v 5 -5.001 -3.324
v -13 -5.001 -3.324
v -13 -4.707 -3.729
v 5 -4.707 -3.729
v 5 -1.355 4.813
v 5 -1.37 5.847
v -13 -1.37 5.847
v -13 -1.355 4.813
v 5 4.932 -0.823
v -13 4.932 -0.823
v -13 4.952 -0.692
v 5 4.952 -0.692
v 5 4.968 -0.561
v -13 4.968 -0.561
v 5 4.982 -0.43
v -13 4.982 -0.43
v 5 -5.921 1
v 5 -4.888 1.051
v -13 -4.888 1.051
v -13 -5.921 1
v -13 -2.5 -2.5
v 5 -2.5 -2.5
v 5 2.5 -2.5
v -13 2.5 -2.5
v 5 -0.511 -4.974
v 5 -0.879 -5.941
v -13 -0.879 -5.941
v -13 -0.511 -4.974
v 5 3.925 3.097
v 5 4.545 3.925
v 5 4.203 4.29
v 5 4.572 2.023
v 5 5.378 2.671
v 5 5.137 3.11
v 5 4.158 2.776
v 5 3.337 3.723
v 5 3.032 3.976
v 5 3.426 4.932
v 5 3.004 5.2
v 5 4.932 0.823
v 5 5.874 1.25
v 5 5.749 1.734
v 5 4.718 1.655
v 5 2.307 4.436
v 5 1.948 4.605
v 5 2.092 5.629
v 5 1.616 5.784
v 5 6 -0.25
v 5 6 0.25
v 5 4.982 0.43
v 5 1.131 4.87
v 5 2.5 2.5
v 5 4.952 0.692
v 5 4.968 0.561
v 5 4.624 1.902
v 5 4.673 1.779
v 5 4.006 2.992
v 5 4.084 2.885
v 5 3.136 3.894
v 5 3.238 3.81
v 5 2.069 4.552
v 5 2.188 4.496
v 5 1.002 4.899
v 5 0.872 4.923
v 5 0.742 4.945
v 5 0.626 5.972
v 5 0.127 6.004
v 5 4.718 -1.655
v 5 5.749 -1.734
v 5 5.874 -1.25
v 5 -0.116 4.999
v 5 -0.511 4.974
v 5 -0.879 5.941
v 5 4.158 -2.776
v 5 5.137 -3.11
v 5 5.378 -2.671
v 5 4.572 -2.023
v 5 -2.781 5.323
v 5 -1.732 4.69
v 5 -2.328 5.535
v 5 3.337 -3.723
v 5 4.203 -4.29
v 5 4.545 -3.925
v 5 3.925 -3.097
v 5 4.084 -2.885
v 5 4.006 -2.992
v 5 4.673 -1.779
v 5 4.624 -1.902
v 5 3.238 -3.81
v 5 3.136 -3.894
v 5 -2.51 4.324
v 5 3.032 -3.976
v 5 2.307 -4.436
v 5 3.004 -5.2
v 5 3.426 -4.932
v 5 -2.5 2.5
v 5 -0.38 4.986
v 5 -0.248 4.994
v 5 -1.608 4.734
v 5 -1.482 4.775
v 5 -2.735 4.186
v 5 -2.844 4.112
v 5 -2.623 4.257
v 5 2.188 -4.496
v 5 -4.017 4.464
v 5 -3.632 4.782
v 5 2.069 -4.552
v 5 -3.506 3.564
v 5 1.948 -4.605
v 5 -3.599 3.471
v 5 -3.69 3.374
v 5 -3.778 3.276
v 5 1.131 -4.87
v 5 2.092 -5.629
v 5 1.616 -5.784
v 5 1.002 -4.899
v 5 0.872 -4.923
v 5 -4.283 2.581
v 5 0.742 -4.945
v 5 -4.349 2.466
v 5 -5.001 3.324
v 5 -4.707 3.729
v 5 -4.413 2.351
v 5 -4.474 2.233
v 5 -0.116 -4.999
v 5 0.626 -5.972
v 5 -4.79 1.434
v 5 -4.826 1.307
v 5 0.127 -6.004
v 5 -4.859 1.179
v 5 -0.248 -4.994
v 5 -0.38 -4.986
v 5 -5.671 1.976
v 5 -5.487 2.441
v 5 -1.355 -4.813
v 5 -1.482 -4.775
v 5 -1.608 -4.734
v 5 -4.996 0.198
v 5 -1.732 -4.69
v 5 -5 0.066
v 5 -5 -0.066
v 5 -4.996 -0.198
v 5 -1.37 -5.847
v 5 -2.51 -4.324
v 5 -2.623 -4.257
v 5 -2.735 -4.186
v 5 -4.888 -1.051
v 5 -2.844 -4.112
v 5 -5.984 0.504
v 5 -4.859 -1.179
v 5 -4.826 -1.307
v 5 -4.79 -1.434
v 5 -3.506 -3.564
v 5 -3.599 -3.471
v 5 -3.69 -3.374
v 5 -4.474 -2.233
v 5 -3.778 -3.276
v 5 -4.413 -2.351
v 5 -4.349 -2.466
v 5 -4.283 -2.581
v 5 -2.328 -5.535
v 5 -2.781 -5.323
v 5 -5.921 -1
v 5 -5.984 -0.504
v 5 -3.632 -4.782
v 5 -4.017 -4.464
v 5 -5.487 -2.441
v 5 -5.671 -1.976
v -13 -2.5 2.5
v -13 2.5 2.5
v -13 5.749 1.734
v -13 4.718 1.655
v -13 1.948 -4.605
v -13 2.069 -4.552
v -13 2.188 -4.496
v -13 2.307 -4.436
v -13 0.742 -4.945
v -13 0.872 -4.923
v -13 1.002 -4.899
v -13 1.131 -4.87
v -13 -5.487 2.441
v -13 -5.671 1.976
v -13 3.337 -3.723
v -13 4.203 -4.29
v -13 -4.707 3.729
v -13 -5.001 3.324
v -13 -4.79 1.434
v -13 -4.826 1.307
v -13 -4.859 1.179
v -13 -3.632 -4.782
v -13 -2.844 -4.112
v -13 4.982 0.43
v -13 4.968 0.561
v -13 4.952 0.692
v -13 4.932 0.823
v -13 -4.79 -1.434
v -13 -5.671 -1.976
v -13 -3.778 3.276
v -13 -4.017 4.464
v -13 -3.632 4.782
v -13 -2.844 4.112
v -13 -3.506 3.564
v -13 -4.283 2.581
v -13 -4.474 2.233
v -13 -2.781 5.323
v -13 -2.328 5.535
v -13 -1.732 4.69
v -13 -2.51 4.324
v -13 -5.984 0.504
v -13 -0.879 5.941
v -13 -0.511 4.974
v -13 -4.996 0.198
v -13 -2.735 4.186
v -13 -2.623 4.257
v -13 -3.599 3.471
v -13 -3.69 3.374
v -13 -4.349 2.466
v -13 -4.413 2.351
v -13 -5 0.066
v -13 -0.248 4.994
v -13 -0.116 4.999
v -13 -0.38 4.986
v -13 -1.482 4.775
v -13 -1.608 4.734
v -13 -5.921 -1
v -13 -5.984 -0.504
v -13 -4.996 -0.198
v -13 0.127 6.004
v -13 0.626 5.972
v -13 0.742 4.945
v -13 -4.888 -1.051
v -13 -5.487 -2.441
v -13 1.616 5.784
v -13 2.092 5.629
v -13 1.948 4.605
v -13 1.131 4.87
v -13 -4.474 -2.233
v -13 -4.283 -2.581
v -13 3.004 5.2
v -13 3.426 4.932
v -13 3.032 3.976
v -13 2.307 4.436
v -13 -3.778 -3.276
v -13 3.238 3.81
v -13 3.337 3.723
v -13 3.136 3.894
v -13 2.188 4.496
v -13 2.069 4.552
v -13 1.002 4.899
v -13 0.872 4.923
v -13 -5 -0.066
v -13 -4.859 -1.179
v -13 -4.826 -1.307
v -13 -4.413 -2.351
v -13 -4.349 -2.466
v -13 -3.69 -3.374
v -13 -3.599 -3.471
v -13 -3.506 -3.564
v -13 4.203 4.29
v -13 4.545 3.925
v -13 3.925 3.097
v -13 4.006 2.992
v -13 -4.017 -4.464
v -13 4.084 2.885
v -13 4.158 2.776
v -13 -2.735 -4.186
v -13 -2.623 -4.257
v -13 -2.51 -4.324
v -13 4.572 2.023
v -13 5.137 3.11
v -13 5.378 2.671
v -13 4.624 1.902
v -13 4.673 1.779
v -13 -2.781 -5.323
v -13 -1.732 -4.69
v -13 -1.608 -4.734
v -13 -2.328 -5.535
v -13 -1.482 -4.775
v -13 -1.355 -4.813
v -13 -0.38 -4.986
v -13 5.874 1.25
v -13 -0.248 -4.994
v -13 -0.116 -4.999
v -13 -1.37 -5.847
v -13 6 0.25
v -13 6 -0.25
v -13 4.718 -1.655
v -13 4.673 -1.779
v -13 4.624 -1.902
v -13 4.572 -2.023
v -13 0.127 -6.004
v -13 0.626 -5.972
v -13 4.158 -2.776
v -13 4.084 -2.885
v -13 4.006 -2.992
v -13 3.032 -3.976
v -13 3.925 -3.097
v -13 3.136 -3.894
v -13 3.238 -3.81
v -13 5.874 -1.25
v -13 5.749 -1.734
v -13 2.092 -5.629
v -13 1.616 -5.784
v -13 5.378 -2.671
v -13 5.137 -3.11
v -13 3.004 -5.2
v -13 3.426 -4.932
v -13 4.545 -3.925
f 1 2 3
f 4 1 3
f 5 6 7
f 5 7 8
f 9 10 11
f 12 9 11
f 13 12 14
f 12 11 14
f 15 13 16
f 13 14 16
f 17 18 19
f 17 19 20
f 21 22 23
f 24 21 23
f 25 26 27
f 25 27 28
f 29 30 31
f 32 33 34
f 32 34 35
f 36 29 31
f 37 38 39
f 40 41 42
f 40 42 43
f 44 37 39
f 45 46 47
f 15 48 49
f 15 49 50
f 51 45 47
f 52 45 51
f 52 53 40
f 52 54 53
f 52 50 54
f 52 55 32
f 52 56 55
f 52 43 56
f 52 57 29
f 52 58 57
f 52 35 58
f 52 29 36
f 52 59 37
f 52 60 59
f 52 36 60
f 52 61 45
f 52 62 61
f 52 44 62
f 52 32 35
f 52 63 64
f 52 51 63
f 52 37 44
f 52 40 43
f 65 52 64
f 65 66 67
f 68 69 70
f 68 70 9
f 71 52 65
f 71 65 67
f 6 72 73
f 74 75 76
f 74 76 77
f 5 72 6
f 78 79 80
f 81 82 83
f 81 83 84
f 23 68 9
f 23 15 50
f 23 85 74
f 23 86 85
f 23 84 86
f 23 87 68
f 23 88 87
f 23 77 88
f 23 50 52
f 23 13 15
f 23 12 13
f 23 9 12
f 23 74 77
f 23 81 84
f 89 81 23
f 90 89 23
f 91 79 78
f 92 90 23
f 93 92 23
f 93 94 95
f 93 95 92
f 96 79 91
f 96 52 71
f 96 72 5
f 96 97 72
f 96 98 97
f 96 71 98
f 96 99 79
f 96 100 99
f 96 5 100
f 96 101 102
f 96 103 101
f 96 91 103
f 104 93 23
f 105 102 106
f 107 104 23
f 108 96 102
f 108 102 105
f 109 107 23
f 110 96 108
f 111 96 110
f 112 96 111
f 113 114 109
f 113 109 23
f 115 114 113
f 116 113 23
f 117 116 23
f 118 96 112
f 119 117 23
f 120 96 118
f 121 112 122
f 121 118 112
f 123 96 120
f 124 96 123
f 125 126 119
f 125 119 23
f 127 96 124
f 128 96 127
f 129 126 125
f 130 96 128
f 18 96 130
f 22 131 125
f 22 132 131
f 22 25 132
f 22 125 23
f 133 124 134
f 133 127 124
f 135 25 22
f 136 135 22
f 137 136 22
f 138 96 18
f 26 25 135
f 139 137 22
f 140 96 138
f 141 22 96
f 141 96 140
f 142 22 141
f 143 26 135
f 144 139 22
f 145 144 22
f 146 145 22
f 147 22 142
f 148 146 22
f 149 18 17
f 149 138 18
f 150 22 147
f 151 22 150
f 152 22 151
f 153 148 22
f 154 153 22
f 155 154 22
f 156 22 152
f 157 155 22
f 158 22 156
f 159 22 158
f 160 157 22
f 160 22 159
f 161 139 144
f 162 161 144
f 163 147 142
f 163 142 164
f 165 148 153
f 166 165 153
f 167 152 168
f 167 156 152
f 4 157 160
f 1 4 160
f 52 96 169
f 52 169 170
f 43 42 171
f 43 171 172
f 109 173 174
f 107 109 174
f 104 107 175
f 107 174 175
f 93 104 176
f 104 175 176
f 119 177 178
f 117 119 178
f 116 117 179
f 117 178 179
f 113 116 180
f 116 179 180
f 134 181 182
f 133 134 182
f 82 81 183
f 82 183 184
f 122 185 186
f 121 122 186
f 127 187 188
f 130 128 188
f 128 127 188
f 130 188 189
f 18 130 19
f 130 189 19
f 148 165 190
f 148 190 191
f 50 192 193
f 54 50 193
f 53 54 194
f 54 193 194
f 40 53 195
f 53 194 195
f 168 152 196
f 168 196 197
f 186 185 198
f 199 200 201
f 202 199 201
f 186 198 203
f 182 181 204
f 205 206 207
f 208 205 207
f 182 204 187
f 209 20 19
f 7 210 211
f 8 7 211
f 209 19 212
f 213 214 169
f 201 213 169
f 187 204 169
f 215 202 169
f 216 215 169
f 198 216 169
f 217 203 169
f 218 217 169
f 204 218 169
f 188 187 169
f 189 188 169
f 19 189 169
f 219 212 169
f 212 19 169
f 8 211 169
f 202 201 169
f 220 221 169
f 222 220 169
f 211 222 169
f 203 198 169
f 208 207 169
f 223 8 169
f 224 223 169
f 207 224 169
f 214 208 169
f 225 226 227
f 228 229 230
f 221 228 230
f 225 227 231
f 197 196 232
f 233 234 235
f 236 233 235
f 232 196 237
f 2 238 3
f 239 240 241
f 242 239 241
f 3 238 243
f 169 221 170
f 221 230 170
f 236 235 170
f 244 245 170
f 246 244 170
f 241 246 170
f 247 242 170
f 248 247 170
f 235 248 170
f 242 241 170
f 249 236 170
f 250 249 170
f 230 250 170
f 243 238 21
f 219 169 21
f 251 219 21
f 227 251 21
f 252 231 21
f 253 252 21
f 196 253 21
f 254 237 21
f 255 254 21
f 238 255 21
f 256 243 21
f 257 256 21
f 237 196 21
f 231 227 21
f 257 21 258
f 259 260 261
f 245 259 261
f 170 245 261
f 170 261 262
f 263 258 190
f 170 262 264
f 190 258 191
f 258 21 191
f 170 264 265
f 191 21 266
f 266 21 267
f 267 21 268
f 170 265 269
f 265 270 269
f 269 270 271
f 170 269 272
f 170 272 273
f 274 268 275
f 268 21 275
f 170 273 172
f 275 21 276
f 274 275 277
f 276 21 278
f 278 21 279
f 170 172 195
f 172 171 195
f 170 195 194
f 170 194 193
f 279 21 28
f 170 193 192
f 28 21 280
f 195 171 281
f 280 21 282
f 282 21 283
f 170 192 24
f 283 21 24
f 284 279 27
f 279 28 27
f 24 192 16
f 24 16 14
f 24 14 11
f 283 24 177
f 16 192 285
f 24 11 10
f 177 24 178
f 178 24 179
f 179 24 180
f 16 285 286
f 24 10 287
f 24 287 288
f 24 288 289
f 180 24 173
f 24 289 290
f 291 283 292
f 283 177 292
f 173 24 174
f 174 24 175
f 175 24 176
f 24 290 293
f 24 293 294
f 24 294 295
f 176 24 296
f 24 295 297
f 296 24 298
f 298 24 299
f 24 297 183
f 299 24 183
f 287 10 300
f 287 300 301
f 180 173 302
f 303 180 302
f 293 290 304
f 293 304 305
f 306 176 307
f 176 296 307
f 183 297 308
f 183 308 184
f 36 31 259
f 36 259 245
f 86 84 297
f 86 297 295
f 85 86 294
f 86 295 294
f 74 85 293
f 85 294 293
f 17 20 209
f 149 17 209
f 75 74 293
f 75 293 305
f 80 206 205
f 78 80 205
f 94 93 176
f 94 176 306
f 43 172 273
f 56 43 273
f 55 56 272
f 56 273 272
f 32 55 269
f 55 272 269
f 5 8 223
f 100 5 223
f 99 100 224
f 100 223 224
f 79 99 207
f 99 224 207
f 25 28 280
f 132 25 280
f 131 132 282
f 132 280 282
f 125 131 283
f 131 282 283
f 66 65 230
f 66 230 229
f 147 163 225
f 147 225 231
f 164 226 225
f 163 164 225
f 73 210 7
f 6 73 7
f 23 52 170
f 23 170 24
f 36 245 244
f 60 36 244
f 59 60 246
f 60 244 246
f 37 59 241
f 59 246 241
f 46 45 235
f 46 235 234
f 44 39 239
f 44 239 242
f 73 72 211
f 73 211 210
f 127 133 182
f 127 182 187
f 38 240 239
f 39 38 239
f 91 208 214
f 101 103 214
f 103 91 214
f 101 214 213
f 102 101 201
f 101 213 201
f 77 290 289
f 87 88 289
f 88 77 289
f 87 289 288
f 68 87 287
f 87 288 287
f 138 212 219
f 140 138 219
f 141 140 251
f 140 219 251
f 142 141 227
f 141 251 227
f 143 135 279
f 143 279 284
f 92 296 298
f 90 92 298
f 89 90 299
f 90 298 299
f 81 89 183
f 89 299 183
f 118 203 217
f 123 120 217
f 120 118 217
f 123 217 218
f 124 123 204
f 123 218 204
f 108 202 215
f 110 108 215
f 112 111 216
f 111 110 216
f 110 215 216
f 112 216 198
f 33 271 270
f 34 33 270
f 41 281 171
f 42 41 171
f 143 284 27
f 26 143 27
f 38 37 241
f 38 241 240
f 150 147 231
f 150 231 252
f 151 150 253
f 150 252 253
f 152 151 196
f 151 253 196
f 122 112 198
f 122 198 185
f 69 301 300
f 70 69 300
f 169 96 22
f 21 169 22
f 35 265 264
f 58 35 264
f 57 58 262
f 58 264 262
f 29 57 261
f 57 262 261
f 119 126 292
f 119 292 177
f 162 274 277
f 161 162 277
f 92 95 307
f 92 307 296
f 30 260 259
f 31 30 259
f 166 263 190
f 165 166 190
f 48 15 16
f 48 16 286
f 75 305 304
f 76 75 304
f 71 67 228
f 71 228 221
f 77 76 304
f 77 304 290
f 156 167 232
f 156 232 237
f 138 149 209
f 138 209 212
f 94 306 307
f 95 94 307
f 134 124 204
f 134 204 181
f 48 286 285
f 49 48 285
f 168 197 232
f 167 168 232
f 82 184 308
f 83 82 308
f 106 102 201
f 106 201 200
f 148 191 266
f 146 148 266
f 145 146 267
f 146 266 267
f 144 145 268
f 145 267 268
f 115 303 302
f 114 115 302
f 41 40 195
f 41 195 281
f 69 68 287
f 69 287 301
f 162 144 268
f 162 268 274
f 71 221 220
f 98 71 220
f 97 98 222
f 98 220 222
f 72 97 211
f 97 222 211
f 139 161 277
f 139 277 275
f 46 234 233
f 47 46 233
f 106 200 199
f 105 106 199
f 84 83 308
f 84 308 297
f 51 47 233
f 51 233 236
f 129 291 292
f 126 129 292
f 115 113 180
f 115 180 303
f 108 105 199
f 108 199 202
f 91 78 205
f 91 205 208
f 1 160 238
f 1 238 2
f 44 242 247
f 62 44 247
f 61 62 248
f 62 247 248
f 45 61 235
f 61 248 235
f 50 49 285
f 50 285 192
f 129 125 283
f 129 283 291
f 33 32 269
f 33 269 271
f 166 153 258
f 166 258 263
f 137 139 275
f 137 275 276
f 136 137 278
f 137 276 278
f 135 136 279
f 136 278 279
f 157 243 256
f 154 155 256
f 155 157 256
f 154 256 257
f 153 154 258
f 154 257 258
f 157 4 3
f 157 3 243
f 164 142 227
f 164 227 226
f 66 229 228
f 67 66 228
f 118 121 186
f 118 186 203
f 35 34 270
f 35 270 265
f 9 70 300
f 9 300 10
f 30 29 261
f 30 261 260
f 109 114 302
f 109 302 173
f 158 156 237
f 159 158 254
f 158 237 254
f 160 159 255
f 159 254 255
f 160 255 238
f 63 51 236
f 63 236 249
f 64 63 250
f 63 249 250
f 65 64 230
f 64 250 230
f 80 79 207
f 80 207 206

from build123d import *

# Parameters (mm, degrees)
BOSS_EXTRUDE2_START      = -13
BOSS_EXTRUDE2_DEPTH      = 18
BOSS_EXTRUDE3_DEPTH      = 5
BOSS_EXTRUDE3_DEPTH_BACK = 13
SKETCH3_R                = 5
CIRPATTERN1_COUNT        = 25
SKETCH4_W                = 5
SKETCH4_H                = 5
CUT_EXTRUDE1_DEPTH       = 18


with BuildPart() as part:
    # Sketch2 → Boss-Extrude2 (new body)
    with BuildSketch(Plane(origin=(0, 0, 0), x_dir=(0, 0, -1), z_dir=(1, 0, 0)).offset(BOSS_EXTRUDE2_START)):
        with BuildLine():
            ThreePointArc((0.429587035, 4.981511315), (0, 5), (-0.429587035, 4.981511315))
            Line((-0.429587035, 4.981511315), (-0.700772987, 3.443539352))
            Line((-0.700772987, 3.443539352), (0.700772987, 3.443539352))
            Line((0.700772987, 3.443539352), (0.429587035, 4.981511315))
        make_face()
        with BuildLine():
            Line((0.25, 6), (-0.25, 6))
            Line((-0.25, 6), (-0.429587035, 4.981511315))
            ThreePointArc((-0.429587035, 4.981511315), (0, 5), (0.429587035, 4.981511315))
            Line((0.429587035, 4.981511315), (0.25, 6))
        make_face()
    boss_extrude2 = extrude(amount=BOSS_EXTRUDE2_DEPTH)

    # Sketch3 → Boss-Extrude3 (add, two sides: drawn at the far end of the back side and taken through both)
    with BuildSketch(Plane(origin=(0, 0, 0), x_dir=(0, 0, -1), z_dir=(1, 0, 0)).offset(-BOSS_EXTRUDE3_DEPTH_BACK)):
        Circle(SKETCH3_R)
    extrude(amount=BOSS_EXTRUDE3_DEPTH + BOSS_EXTRUDE3_DEPTH_BACK)

    # CirPattern1: Boss-Extrude2 ×25 about axis
    cirpattern1_axis = Axis((0, 0, 0), (1, 0, 0))
    for i in range(1, CIRPATTERN1_COUNT):
        add(boss_extrude2.rotate(cirpattern1_axis, i * 360 / CIRPATTERN1_COUNT))

    # Sketch4 → Cut-Extrude1 (cut)
    with BuildSketch(Plane(origin=(5, 0, 0), x_dir=(0, 0, -1), z_dir=(1, 0, 0))):
        Rectangle(SKETCH4_W, SKETCH4_H)
    extrude(amount=-CUT_EXTRUDE1_DEPTH, mode=Mode.SUBTRACT)


solid = part.part
